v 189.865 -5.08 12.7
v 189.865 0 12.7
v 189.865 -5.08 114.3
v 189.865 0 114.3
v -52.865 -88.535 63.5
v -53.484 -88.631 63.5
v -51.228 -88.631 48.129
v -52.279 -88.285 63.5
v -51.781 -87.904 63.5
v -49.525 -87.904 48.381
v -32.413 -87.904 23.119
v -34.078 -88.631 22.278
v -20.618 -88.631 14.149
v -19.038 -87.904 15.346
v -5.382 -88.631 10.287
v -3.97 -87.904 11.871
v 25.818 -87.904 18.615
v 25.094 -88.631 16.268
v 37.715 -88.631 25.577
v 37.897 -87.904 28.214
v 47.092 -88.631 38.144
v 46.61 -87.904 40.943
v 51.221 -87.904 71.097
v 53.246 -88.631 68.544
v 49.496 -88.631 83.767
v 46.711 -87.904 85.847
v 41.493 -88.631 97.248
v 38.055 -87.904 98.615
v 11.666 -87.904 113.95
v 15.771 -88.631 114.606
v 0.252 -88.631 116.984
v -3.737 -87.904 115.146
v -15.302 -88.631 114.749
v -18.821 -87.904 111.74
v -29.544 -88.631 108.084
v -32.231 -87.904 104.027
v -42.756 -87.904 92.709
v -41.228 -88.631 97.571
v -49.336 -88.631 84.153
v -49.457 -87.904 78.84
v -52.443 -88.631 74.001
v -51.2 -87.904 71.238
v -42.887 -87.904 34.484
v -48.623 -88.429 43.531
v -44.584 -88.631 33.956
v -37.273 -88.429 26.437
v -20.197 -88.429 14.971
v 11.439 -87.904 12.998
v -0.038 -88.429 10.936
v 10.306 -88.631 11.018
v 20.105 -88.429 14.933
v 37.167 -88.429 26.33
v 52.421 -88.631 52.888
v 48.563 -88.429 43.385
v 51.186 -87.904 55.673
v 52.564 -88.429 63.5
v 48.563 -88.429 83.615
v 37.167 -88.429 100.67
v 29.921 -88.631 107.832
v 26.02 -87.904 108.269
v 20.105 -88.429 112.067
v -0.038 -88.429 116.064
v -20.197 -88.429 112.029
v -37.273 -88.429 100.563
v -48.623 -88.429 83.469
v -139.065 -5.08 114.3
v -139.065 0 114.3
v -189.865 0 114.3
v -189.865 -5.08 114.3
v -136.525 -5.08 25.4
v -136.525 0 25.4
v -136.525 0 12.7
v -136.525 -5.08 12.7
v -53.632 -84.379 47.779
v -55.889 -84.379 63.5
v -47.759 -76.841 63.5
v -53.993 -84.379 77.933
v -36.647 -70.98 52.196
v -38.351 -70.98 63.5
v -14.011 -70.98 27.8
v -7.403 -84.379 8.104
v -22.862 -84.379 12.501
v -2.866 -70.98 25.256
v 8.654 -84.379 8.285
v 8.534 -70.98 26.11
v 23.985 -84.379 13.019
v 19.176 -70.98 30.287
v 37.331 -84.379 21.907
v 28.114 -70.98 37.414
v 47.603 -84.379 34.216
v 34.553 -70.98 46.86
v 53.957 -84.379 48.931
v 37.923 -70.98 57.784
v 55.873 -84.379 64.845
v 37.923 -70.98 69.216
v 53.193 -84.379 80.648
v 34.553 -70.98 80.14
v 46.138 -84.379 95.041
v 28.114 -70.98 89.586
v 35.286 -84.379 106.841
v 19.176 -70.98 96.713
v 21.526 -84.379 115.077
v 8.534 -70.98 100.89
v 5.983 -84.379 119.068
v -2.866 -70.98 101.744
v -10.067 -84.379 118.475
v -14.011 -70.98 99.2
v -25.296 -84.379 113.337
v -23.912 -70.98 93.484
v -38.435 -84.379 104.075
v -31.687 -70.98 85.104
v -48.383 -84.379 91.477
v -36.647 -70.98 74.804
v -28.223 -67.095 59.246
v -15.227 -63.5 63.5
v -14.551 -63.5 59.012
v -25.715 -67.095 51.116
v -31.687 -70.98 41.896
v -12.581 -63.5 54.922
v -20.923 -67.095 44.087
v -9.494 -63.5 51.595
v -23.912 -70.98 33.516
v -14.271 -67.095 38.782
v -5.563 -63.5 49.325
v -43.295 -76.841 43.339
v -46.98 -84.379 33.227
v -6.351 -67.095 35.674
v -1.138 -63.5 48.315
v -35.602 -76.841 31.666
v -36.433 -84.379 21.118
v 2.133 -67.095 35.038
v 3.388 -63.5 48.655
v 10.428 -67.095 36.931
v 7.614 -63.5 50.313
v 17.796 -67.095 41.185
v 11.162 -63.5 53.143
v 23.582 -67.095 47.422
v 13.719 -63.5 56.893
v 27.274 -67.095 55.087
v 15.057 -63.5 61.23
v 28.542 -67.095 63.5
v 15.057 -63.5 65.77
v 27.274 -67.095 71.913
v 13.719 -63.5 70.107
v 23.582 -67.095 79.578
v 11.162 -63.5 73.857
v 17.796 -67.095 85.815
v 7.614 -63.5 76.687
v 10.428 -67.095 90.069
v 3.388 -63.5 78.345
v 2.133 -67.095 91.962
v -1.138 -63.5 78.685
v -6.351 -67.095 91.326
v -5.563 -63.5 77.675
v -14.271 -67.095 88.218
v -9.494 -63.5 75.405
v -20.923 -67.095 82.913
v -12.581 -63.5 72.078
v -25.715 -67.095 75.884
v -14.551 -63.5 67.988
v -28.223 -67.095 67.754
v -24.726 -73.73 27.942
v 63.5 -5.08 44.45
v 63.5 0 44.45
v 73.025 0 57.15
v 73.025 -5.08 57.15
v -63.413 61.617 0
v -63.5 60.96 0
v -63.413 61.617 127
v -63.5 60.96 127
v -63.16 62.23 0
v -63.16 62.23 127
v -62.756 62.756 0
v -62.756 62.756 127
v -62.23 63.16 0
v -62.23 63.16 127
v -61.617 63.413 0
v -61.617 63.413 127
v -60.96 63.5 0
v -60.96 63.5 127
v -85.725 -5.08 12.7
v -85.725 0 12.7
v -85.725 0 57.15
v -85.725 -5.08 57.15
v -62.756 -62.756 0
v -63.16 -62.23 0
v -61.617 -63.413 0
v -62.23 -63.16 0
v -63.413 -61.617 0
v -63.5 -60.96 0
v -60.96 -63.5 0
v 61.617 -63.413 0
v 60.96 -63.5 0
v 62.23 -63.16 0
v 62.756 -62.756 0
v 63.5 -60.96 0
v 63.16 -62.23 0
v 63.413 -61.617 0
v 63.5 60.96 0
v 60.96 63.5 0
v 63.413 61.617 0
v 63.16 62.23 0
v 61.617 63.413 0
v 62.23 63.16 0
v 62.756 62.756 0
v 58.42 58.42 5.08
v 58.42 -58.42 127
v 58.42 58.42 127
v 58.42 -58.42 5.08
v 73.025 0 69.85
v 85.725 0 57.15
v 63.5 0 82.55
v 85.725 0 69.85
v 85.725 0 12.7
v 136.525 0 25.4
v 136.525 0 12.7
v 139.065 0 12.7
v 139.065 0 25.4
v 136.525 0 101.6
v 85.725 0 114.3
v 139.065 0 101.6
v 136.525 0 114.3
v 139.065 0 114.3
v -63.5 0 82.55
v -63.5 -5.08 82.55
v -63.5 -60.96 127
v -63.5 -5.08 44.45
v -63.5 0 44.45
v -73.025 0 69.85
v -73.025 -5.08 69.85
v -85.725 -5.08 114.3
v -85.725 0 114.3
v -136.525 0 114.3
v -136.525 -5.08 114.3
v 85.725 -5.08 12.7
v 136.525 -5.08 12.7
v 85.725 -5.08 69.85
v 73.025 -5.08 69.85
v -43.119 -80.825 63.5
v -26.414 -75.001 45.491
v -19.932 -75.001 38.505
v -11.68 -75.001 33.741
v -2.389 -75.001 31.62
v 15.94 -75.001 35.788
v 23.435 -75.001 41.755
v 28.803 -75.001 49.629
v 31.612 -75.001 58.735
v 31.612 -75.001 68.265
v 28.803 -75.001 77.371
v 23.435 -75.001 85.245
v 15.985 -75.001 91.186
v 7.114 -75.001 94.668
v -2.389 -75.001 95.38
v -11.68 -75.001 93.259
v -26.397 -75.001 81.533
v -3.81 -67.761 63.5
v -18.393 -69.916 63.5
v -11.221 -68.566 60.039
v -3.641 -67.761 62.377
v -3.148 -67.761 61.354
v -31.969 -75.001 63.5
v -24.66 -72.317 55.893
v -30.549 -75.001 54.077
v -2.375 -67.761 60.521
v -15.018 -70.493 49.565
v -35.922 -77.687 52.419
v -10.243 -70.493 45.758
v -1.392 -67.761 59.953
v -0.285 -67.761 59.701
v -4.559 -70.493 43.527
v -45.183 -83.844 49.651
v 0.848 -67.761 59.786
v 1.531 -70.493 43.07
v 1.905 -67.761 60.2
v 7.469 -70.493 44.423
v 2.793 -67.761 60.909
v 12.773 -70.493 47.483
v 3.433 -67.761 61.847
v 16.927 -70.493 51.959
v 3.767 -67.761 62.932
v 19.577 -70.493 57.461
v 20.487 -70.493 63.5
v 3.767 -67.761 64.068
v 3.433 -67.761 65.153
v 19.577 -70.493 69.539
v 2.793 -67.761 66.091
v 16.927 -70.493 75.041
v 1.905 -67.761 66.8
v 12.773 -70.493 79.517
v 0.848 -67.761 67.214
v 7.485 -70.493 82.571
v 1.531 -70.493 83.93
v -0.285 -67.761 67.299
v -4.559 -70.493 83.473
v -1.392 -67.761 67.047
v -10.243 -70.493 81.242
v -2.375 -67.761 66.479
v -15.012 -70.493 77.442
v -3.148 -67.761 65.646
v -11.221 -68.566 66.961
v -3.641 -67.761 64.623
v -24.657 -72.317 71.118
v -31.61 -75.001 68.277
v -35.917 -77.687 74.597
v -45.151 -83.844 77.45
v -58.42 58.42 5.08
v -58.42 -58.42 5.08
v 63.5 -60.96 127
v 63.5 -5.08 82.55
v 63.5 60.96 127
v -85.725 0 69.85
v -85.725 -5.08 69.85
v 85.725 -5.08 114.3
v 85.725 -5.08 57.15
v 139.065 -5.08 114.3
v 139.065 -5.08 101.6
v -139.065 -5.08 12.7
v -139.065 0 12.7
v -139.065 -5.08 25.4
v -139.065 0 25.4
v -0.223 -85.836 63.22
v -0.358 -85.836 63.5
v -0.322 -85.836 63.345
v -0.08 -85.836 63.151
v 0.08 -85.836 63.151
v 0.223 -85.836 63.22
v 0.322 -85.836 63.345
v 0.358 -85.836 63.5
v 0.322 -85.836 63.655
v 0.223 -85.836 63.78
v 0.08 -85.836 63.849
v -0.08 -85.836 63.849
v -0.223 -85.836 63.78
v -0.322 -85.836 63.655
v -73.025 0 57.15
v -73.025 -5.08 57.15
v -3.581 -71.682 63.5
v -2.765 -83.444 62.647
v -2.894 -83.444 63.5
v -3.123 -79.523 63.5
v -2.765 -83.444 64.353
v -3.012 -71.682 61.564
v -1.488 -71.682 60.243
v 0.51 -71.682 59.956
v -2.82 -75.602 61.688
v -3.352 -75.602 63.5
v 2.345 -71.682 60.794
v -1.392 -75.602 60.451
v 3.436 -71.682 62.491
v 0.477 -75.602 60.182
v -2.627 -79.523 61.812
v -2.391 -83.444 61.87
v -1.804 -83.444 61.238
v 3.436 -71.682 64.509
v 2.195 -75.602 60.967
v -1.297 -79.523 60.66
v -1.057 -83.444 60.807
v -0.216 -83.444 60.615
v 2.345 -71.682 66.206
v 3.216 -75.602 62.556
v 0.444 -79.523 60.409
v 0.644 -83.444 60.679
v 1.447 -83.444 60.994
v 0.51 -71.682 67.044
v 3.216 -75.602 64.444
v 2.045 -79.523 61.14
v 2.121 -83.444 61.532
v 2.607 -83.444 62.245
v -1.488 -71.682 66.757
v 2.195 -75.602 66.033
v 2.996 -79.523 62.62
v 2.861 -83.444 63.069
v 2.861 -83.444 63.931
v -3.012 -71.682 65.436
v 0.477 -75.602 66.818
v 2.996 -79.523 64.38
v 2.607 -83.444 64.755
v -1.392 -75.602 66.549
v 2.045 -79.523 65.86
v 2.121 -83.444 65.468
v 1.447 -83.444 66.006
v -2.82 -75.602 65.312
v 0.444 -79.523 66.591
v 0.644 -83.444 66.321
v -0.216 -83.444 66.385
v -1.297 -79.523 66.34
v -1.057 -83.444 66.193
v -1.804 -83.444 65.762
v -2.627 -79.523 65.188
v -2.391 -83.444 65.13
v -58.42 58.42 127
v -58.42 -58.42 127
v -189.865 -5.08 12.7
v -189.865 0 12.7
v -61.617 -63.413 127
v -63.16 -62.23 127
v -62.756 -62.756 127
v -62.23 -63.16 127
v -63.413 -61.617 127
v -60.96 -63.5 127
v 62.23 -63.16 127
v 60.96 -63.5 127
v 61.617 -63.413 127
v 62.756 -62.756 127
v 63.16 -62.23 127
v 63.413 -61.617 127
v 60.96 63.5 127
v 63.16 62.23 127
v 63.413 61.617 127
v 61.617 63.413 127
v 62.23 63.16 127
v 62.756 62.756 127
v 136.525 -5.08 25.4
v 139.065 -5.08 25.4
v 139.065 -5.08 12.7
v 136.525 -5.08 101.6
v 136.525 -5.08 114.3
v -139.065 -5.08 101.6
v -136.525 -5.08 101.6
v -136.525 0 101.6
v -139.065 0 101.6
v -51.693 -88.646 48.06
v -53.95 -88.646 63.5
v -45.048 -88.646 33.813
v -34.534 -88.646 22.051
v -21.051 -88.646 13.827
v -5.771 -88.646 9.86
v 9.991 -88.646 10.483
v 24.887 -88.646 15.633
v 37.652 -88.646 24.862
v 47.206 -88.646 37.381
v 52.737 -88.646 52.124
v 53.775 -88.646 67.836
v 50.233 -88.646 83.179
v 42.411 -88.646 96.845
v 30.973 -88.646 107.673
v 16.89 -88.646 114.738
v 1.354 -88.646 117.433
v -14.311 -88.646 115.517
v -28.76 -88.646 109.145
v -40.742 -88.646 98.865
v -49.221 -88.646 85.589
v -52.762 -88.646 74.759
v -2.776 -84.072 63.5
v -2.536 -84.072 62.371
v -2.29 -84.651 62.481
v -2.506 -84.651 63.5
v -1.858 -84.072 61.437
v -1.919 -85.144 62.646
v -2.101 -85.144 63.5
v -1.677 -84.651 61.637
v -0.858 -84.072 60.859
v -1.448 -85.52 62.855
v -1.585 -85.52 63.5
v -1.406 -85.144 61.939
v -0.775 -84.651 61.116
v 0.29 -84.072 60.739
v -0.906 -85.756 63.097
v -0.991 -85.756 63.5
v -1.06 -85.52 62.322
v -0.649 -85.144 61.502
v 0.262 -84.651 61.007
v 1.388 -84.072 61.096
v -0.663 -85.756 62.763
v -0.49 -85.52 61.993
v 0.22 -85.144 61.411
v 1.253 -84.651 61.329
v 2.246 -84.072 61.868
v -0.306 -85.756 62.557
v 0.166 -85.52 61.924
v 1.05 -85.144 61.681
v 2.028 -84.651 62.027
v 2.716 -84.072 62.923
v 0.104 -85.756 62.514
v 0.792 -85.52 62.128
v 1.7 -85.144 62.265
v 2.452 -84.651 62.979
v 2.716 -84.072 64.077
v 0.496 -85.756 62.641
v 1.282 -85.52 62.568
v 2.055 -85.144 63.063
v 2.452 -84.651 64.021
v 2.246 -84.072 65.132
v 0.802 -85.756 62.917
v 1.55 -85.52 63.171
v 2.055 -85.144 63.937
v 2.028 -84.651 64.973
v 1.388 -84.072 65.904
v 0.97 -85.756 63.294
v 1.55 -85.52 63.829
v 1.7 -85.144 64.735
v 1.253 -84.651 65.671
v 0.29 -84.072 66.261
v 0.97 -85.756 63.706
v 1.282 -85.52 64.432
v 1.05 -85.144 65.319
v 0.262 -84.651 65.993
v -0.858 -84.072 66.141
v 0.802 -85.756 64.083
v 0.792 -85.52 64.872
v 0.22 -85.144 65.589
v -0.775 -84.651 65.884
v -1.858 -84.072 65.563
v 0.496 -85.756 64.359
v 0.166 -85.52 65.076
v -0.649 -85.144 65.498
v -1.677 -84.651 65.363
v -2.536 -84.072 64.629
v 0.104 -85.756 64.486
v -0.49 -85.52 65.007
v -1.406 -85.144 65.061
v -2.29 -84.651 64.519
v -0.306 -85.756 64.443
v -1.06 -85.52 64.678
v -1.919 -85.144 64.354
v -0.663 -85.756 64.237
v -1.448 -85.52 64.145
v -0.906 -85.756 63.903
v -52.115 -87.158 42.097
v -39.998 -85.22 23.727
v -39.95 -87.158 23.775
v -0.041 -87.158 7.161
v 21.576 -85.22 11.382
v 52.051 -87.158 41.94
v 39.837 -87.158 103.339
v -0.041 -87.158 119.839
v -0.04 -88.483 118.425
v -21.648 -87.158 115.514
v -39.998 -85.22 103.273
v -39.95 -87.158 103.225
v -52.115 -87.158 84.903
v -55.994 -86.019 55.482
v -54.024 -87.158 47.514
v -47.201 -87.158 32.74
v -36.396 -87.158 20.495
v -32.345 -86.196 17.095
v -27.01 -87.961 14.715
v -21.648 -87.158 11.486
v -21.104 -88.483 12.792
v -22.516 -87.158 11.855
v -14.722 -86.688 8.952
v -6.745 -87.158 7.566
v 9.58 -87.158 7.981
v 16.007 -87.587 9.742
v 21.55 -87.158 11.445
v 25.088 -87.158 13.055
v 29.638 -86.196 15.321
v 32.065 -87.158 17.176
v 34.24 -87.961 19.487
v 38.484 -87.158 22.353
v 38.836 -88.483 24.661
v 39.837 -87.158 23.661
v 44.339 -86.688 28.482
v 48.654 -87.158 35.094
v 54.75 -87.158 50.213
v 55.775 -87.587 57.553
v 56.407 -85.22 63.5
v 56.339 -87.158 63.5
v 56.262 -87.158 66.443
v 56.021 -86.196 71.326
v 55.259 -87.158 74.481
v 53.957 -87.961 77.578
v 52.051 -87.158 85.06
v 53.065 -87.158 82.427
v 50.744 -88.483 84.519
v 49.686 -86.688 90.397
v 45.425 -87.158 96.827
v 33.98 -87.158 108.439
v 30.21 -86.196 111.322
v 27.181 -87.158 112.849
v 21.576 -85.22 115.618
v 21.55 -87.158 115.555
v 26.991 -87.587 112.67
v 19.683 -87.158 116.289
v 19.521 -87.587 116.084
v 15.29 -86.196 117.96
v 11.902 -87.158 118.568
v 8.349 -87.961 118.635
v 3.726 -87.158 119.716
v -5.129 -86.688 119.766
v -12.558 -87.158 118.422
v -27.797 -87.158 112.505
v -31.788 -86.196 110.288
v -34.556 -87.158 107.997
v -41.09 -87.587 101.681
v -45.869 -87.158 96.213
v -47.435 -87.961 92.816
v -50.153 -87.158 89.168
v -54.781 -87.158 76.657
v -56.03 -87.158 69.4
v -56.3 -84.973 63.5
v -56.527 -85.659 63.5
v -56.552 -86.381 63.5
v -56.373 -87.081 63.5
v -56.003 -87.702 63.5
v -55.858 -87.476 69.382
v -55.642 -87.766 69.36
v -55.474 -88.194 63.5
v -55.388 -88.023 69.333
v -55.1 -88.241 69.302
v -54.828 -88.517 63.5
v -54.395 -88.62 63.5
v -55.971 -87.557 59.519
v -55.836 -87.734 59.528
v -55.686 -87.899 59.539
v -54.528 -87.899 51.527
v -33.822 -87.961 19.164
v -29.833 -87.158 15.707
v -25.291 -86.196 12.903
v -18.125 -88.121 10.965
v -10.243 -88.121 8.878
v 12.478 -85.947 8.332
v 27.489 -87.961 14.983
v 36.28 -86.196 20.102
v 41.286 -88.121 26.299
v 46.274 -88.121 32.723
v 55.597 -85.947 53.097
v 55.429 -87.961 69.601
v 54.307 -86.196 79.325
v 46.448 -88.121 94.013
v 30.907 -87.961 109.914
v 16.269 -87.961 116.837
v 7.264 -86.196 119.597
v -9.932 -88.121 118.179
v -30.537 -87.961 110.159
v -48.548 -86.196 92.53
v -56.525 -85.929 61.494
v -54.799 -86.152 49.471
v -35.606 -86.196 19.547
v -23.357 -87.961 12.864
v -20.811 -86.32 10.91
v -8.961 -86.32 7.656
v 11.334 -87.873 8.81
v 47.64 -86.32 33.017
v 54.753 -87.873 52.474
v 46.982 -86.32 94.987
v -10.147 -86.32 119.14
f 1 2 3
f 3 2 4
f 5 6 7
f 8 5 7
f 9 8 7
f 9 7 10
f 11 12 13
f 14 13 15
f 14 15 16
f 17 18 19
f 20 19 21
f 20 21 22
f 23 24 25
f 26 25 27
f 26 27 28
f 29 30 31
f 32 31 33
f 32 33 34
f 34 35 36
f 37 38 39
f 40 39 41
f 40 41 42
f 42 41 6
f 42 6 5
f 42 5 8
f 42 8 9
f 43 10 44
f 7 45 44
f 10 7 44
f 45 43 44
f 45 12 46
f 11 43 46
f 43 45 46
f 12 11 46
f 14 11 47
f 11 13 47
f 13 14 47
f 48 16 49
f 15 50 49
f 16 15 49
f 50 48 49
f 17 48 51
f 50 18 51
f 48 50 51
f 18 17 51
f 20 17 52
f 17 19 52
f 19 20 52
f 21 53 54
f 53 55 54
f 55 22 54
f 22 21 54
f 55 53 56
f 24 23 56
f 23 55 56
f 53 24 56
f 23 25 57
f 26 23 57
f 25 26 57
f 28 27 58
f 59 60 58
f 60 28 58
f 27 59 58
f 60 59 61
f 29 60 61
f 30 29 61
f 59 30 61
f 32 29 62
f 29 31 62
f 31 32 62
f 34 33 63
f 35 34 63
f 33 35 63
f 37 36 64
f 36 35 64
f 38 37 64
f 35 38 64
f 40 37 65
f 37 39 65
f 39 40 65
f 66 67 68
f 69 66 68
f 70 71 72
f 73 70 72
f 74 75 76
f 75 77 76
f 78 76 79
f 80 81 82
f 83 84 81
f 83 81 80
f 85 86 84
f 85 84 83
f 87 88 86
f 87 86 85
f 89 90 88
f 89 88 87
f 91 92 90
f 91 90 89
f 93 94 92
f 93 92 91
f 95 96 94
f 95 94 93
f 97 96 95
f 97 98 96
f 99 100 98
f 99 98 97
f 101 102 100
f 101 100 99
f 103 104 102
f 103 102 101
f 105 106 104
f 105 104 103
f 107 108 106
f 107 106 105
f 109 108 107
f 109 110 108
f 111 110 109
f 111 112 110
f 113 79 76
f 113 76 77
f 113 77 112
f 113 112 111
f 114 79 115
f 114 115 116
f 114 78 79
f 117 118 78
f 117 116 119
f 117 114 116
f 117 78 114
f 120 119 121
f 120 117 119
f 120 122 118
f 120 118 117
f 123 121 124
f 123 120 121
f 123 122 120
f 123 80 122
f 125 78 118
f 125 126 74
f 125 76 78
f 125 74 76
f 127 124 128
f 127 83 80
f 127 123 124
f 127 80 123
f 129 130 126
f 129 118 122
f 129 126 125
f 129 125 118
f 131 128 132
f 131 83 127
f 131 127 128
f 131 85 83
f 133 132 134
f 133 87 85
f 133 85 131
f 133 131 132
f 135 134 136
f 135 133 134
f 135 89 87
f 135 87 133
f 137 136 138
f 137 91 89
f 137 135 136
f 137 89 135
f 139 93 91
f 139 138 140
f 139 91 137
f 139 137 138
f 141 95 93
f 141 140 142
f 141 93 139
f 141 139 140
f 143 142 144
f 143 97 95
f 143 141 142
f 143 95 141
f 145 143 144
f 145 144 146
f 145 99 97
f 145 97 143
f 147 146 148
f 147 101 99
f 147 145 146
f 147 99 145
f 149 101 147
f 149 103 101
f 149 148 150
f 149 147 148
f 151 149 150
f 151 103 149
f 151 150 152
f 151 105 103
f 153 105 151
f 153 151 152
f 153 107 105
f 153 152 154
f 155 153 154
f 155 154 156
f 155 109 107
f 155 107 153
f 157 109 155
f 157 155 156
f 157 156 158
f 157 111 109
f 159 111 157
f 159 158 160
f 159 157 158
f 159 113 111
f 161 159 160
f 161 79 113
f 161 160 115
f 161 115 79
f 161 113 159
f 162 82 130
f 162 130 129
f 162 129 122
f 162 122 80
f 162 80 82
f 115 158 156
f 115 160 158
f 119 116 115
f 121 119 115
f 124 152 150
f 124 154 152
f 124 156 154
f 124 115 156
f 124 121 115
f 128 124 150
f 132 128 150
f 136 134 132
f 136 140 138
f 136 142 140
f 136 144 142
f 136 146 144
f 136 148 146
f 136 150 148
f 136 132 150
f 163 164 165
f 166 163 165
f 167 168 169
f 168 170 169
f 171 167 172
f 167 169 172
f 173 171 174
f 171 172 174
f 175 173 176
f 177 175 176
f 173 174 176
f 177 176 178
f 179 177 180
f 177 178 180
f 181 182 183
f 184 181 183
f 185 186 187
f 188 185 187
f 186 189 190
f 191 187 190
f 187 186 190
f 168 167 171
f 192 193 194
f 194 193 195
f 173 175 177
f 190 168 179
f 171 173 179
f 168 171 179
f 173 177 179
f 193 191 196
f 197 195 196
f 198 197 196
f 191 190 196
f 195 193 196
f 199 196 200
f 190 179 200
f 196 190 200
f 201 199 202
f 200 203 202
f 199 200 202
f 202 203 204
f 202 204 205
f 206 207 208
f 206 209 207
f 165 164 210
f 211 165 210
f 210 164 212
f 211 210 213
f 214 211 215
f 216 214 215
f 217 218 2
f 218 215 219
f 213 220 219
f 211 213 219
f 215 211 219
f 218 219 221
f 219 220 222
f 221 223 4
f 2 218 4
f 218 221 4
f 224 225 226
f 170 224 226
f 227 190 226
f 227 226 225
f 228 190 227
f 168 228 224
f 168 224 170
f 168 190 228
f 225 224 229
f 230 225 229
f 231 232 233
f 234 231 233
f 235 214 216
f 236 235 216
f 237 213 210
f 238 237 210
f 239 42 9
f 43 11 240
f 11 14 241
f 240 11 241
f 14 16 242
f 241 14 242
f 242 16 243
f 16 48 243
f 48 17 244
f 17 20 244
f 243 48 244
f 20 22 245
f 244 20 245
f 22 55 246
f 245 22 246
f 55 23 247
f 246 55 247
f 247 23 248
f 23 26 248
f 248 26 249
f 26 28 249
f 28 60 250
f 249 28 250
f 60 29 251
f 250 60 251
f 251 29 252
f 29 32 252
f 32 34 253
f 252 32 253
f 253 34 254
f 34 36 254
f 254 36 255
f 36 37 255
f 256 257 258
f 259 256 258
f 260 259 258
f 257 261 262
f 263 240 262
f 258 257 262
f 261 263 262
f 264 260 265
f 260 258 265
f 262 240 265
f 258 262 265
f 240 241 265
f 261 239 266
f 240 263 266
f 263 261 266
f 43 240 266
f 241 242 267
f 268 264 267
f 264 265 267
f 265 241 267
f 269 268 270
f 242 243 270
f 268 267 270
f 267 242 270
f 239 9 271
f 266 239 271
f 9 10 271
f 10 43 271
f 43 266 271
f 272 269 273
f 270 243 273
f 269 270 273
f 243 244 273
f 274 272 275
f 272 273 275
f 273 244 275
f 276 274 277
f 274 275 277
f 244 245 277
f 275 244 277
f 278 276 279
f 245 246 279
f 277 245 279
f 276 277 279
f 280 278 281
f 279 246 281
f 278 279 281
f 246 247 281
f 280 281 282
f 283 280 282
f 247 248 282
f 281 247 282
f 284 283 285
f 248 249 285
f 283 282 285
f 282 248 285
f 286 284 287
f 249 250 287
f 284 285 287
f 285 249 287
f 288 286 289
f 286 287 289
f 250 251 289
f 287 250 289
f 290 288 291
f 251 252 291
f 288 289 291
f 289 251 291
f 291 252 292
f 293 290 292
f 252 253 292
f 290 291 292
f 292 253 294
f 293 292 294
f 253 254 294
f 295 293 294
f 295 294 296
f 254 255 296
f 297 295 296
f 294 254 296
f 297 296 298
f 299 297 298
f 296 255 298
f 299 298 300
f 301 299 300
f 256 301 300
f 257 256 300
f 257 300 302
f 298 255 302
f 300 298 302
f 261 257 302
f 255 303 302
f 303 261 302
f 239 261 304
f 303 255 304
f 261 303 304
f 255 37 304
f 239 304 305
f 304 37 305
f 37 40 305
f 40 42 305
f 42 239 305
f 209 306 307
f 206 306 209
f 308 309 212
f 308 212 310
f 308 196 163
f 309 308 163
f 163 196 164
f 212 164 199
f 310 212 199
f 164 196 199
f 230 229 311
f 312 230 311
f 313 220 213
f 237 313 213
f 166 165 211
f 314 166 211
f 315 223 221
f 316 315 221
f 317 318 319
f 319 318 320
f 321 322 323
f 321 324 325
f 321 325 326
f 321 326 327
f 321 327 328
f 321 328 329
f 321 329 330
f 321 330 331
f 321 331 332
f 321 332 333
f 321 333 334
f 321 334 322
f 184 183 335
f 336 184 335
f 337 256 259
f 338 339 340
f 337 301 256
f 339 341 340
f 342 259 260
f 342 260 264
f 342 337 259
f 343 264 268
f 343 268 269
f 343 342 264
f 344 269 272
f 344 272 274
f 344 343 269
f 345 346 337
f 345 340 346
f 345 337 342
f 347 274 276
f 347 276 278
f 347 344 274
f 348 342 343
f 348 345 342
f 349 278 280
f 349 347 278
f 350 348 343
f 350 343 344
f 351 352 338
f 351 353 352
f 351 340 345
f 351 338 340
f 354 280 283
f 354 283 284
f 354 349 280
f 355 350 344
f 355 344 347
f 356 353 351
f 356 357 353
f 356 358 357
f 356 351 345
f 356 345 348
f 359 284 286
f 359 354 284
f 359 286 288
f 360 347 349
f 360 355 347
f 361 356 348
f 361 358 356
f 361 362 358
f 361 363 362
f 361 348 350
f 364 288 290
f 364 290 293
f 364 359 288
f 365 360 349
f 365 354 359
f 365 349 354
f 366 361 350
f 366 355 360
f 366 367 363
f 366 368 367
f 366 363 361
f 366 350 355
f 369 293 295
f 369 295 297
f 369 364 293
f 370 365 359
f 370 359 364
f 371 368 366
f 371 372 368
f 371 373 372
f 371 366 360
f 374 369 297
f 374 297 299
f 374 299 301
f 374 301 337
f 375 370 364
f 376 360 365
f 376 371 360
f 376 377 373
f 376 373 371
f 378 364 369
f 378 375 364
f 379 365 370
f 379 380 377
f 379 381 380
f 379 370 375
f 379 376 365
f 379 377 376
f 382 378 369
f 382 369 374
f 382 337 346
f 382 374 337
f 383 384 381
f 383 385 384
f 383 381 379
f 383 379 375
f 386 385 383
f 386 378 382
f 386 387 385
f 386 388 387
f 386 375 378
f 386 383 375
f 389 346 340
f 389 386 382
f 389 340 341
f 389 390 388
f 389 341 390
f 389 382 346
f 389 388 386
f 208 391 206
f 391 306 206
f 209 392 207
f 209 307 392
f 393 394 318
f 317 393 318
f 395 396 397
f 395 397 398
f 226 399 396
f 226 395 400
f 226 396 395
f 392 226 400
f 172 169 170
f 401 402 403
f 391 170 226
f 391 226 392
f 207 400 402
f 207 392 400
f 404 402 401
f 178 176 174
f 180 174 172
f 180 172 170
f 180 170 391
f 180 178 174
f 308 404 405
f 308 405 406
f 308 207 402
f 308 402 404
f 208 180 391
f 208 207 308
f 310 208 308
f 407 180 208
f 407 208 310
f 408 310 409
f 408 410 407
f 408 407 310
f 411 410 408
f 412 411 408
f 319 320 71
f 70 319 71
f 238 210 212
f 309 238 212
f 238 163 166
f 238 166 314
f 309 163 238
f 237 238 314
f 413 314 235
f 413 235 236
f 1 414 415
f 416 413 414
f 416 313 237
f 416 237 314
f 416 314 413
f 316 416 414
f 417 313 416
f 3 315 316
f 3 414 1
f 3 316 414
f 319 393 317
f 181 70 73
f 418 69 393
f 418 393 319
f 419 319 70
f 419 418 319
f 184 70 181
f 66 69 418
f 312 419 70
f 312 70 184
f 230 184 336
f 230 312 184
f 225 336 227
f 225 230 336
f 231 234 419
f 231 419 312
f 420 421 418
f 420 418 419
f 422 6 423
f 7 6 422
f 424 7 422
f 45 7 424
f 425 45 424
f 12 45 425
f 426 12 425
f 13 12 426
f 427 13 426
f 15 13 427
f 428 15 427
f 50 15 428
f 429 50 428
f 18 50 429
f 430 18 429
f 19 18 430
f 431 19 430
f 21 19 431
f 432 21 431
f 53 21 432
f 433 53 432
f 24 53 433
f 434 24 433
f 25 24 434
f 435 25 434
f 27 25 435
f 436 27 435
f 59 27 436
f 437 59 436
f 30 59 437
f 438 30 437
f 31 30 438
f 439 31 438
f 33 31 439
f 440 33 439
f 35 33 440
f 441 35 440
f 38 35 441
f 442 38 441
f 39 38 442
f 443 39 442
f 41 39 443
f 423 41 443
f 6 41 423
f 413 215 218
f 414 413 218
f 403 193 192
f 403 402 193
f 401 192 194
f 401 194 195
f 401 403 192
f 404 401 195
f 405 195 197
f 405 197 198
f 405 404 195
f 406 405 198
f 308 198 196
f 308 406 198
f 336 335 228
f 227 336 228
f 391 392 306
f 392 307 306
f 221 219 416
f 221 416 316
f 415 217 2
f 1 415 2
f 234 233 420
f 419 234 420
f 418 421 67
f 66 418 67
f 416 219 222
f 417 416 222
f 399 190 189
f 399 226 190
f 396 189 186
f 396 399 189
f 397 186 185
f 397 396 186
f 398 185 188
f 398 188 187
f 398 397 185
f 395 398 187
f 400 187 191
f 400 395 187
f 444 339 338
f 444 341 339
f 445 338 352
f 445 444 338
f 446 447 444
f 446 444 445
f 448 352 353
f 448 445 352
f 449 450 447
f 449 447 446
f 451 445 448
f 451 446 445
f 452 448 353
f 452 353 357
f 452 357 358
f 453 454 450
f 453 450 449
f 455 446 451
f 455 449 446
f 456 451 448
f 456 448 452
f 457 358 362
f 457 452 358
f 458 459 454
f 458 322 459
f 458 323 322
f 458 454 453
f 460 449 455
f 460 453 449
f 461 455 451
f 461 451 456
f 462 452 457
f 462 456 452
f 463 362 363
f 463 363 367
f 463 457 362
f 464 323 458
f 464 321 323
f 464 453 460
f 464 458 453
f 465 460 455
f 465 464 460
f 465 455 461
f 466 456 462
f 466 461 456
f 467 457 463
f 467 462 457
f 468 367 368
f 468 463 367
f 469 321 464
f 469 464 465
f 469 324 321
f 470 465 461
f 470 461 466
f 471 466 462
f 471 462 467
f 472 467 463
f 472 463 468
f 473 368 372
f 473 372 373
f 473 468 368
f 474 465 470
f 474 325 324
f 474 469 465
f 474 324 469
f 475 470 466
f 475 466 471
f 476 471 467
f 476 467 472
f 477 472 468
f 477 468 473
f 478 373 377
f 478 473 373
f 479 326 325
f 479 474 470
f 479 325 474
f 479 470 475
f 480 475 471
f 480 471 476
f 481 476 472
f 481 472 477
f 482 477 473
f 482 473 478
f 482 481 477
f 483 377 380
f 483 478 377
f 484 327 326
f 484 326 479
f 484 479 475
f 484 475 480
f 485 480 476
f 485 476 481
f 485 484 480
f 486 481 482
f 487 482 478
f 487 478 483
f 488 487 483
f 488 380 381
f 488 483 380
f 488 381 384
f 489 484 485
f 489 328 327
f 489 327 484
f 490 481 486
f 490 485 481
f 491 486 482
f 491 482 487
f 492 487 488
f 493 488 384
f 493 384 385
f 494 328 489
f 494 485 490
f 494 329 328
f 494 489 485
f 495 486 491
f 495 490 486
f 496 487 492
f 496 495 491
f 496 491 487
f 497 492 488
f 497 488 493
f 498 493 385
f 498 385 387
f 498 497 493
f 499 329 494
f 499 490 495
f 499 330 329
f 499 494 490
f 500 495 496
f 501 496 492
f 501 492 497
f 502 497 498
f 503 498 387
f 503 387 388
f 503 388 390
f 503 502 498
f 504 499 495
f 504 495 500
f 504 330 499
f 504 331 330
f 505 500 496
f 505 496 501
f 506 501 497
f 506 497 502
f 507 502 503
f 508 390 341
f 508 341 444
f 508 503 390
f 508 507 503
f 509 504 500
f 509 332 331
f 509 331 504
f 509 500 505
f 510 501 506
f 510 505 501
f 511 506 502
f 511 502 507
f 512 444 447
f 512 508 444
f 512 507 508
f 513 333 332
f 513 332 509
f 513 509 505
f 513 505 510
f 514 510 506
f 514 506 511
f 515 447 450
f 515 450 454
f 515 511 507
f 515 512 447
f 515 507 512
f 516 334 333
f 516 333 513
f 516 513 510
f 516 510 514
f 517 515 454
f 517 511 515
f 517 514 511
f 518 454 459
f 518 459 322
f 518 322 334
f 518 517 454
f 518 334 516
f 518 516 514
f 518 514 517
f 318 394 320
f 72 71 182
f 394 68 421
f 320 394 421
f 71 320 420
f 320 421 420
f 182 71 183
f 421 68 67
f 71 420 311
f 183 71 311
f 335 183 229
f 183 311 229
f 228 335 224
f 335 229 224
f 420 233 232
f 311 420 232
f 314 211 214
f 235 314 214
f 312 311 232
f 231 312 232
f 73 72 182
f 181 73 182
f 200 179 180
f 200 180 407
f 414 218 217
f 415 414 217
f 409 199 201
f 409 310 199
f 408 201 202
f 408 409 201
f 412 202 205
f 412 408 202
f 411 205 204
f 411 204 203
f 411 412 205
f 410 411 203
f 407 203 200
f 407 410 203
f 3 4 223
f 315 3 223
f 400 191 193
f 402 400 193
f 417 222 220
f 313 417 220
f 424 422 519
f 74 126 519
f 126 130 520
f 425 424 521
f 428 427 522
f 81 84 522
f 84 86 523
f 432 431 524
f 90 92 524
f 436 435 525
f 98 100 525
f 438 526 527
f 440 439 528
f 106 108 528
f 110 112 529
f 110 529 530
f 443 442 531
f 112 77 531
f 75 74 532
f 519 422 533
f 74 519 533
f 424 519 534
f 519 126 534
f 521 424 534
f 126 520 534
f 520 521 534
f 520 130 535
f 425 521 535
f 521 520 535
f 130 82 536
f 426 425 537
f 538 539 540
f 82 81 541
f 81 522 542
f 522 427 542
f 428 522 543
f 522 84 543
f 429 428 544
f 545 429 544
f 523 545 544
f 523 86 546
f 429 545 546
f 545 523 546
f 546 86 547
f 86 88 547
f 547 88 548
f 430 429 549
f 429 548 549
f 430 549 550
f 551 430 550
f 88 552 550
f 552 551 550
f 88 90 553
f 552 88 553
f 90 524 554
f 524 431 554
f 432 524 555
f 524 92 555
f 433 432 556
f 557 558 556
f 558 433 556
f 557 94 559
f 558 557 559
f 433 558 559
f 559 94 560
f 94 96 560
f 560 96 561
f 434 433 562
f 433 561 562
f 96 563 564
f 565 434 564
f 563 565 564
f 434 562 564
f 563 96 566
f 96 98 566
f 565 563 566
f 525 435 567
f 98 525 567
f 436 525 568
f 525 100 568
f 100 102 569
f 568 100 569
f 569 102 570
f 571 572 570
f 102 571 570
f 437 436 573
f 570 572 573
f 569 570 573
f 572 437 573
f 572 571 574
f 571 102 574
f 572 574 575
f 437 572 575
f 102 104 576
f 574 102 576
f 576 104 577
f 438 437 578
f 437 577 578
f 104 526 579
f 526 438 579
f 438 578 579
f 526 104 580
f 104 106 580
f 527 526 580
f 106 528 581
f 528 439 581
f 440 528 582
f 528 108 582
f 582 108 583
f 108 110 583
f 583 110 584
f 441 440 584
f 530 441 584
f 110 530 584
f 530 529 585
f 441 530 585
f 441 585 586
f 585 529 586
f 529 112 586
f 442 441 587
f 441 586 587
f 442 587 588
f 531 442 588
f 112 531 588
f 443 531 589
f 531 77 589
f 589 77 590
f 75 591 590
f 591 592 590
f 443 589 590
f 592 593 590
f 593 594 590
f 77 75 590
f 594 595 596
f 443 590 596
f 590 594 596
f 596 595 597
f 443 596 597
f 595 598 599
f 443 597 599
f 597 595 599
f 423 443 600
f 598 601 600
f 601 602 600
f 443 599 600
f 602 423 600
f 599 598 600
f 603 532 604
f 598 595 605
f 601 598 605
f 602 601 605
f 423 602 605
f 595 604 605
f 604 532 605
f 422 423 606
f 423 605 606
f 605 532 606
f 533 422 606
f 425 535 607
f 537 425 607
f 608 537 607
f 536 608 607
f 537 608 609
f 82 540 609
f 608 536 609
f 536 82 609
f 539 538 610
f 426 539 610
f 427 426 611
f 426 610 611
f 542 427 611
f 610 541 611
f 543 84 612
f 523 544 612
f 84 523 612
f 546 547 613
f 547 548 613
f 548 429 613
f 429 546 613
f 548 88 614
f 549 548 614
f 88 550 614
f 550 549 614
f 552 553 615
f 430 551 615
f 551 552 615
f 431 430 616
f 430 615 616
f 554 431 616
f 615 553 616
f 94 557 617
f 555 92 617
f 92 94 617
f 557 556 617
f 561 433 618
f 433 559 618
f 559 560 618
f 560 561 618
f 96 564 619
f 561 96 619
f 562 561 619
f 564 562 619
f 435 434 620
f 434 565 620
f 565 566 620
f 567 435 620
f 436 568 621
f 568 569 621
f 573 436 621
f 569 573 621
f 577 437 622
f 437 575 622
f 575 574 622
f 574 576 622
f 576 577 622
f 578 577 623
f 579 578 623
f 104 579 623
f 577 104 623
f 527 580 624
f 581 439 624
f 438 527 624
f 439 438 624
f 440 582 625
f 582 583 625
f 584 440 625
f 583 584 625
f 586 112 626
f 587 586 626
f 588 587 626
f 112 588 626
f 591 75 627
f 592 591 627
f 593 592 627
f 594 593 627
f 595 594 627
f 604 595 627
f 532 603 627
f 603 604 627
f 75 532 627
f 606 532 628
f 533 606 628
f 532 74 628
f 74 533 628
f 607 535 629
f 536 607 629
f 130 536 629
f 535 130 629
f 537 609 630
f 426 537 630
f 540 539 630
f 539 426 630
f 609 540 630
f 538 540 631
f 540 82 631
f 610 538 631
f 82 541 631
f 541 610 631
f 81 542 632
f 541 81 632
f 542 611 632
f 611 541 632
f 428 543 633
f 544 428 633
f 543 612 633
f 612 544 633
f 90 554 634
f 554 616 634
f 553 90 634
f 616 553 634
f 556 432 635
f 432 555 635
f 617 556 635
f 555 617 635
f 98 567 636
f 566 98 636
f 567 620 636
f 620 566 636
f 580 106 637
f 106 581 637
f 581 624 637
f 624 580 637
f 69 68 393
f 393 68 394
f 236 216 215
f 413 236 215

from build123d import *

# Parameters (mm, degrees)
F0_W      = 127
F0_H      = 127
F1_DEPTH  = 127
F2_T      = -5.08
F6_R      = 2.54
F11_R     = 2.54
F12_R     = 2.54
F13_W     = 2.54
F13_H     = 76.2
F14_DEPTH = 5.08


with BuildPart() as f1:
    # F0 (on Top) → F1 (new body)
    with BuildSketch(Plane.XY):
        Rectangle(F0_W, F0_H)
    extrude(amount=F1_DEPTH)

    # F2
    f2_openings = [f1.faces().sort_by_distance(p)[0] for p in [
        (0, 0, 127),
    ]]
    offset(amount=F2_T, openings=f2_openings)

    # F6
    f6_edges = [f1.edges().sort_by_distance(p)[0] for p in [
        (-63.5, -63.5, 63.5),
        (63.5, -63.5, 63.5),
        (63.5, 63.5, 63.5),
        (-63.5, 63.5, 63.5),
    ]]
    fillet(f6_edges, radius=F6_R)

    # F13 (on Front) → F14 (join)
    with BuildSketch(Plane.XZ):
        Polygon((-85.725, 114.3), (-136.525, 114.3), (-136.525, 101.6), (-136.525, 25.4), (-136.525, 12.7), (-85.725, 12.7), (-85.725, 57.15), (-85.725, 69.85), align=None)
        with Locations((-137.795, 63.5)):
            Rectangle(F13_W, F13_H)
        Polygon((-73.025, 69.85), (-85.725, 69.85), (-85.725, 57.15), (-73.025, 57.15), (-63.5, 44.45), (-63.5, 82.55), align=None)
        Polygon((-139.065, 25.4), (-139.065, 101.6), (-139.065, 114.3), (-189.865, 114.3), (-189.865, 12.7), (-139.065, 12.7), align=None)
        Polygon((85.725, 57.15), (85.725, 69.85), (73.025, 69.85), (63.5, 82.55), (63.5, 44.45), (73.025, 57.15), align=None)
        Polygon((85.725, 114.3), (85.725, 69.85), (85.725, 57.15), (85.725, 12.7), (136.525, 12.7), (136.525, 25.4), (136.525, 101.6), (136.525, 114.3), align=None)
        with Locations((137.795, 63.5)):
            Rectangle(F13_W, F13_H)
        Polygon((139.065, 114.3), (139.065, 101.6), (139.065, 25.4), (139.065, 12.7), (189.865, 12.7), (189.865, 114.3), align=None)
    extrude(amount=F14_DEPTH)


with BuildPart() as f10:
    # F8 (on offset) → F10 (revolve)
    with BuildSketch(Plane.XY.offset(63.5)):
        with BuildLine():
            Line((0, -85.8360975981), (0, -67.6244348288))
            add(Edge.make_bspline(
                [(0, -67.6244348288), (-1.3181296929, -67.6471609021), (-2.58705429, -67.6932761967), (-3.81, -67.7606751777)],
                knots=[0, 0, 0, 0, 0.0424536552, 0.0424536552, 0.0424536552, 0.0424536552], degree=3))
            Line((-3.81, -67.7606751777), (-2.7537473964, -85.8360975981))
            Line((-2.7537473964, -85.8360975981), (0, -85.8360975981))
        make_face()
        with BuildLine():
            add(Edge.make_bspline(
                [(0, -67.6244348288), (-1.3181296929, -67.6471609021), (-2.58705429, -67.6932761967), (-3.81, -67.7606751777)],
                knots=[0, 0, 0, 0, 0.0424536552, 0.0424536552, 0.0424536552, 0.0424536552], degree=3))
            Line((0, -67.6244348288), (0, -63.5))
            Line((0, -63.5), (-15.2272759005, -63.5))
            add(Edge.make_bspline(
                [(-15.2272759005, -63.5), (-29.8885186315, -66.8833619164), (-44.5856567443, -72.7379867121), (-54.9380147391, -83.0088070459), (-59.7811602056, -88.8225883245)],
                knots=[0, 0, 0, 0, 0.5538537115, 1, 1, 1, 1], degree=3))
            Line((-59.7811602056, -88.8225883245), (-52.4810627103, -88.6010231018))
            add(Edge.make_bspline(
                [(-3.81, -67.7606751777), (-18.4508074737, -68.5675593244), (-33.6190588324, -75.8348587349), (-45.0453271498, -81.1062681131), (-52.4810627103, -88.6010231018)],
                knots=[0.0424536552, 0.0424536552, 0.0424536552, 0.0424536552, 0.5506984514, 1, 1, 1, 1], degree=3))
        make_face()
    revolve(axis=Axis((0, -78.1127289653, 63.5), (0, -1, 0)))

    # F11
    f11_edges = [f10.edges().sort_by_distance(p)[0] for p in [
        (59.78116, -88.822588, 63.5),
        (52.481063, -88.601023, 63.5),
    ]]
    fillet(f11_edges, radius=F11_R)

    # F12
    f12_edges = [f10.edges().sort_by_distance(p)[0] for p in [
        (2.753747, -85.836098, 63.5),
    ]]
    fillet(f12_edges, radius=F12_R)


solid = Compound([f1.part, f10.part])
